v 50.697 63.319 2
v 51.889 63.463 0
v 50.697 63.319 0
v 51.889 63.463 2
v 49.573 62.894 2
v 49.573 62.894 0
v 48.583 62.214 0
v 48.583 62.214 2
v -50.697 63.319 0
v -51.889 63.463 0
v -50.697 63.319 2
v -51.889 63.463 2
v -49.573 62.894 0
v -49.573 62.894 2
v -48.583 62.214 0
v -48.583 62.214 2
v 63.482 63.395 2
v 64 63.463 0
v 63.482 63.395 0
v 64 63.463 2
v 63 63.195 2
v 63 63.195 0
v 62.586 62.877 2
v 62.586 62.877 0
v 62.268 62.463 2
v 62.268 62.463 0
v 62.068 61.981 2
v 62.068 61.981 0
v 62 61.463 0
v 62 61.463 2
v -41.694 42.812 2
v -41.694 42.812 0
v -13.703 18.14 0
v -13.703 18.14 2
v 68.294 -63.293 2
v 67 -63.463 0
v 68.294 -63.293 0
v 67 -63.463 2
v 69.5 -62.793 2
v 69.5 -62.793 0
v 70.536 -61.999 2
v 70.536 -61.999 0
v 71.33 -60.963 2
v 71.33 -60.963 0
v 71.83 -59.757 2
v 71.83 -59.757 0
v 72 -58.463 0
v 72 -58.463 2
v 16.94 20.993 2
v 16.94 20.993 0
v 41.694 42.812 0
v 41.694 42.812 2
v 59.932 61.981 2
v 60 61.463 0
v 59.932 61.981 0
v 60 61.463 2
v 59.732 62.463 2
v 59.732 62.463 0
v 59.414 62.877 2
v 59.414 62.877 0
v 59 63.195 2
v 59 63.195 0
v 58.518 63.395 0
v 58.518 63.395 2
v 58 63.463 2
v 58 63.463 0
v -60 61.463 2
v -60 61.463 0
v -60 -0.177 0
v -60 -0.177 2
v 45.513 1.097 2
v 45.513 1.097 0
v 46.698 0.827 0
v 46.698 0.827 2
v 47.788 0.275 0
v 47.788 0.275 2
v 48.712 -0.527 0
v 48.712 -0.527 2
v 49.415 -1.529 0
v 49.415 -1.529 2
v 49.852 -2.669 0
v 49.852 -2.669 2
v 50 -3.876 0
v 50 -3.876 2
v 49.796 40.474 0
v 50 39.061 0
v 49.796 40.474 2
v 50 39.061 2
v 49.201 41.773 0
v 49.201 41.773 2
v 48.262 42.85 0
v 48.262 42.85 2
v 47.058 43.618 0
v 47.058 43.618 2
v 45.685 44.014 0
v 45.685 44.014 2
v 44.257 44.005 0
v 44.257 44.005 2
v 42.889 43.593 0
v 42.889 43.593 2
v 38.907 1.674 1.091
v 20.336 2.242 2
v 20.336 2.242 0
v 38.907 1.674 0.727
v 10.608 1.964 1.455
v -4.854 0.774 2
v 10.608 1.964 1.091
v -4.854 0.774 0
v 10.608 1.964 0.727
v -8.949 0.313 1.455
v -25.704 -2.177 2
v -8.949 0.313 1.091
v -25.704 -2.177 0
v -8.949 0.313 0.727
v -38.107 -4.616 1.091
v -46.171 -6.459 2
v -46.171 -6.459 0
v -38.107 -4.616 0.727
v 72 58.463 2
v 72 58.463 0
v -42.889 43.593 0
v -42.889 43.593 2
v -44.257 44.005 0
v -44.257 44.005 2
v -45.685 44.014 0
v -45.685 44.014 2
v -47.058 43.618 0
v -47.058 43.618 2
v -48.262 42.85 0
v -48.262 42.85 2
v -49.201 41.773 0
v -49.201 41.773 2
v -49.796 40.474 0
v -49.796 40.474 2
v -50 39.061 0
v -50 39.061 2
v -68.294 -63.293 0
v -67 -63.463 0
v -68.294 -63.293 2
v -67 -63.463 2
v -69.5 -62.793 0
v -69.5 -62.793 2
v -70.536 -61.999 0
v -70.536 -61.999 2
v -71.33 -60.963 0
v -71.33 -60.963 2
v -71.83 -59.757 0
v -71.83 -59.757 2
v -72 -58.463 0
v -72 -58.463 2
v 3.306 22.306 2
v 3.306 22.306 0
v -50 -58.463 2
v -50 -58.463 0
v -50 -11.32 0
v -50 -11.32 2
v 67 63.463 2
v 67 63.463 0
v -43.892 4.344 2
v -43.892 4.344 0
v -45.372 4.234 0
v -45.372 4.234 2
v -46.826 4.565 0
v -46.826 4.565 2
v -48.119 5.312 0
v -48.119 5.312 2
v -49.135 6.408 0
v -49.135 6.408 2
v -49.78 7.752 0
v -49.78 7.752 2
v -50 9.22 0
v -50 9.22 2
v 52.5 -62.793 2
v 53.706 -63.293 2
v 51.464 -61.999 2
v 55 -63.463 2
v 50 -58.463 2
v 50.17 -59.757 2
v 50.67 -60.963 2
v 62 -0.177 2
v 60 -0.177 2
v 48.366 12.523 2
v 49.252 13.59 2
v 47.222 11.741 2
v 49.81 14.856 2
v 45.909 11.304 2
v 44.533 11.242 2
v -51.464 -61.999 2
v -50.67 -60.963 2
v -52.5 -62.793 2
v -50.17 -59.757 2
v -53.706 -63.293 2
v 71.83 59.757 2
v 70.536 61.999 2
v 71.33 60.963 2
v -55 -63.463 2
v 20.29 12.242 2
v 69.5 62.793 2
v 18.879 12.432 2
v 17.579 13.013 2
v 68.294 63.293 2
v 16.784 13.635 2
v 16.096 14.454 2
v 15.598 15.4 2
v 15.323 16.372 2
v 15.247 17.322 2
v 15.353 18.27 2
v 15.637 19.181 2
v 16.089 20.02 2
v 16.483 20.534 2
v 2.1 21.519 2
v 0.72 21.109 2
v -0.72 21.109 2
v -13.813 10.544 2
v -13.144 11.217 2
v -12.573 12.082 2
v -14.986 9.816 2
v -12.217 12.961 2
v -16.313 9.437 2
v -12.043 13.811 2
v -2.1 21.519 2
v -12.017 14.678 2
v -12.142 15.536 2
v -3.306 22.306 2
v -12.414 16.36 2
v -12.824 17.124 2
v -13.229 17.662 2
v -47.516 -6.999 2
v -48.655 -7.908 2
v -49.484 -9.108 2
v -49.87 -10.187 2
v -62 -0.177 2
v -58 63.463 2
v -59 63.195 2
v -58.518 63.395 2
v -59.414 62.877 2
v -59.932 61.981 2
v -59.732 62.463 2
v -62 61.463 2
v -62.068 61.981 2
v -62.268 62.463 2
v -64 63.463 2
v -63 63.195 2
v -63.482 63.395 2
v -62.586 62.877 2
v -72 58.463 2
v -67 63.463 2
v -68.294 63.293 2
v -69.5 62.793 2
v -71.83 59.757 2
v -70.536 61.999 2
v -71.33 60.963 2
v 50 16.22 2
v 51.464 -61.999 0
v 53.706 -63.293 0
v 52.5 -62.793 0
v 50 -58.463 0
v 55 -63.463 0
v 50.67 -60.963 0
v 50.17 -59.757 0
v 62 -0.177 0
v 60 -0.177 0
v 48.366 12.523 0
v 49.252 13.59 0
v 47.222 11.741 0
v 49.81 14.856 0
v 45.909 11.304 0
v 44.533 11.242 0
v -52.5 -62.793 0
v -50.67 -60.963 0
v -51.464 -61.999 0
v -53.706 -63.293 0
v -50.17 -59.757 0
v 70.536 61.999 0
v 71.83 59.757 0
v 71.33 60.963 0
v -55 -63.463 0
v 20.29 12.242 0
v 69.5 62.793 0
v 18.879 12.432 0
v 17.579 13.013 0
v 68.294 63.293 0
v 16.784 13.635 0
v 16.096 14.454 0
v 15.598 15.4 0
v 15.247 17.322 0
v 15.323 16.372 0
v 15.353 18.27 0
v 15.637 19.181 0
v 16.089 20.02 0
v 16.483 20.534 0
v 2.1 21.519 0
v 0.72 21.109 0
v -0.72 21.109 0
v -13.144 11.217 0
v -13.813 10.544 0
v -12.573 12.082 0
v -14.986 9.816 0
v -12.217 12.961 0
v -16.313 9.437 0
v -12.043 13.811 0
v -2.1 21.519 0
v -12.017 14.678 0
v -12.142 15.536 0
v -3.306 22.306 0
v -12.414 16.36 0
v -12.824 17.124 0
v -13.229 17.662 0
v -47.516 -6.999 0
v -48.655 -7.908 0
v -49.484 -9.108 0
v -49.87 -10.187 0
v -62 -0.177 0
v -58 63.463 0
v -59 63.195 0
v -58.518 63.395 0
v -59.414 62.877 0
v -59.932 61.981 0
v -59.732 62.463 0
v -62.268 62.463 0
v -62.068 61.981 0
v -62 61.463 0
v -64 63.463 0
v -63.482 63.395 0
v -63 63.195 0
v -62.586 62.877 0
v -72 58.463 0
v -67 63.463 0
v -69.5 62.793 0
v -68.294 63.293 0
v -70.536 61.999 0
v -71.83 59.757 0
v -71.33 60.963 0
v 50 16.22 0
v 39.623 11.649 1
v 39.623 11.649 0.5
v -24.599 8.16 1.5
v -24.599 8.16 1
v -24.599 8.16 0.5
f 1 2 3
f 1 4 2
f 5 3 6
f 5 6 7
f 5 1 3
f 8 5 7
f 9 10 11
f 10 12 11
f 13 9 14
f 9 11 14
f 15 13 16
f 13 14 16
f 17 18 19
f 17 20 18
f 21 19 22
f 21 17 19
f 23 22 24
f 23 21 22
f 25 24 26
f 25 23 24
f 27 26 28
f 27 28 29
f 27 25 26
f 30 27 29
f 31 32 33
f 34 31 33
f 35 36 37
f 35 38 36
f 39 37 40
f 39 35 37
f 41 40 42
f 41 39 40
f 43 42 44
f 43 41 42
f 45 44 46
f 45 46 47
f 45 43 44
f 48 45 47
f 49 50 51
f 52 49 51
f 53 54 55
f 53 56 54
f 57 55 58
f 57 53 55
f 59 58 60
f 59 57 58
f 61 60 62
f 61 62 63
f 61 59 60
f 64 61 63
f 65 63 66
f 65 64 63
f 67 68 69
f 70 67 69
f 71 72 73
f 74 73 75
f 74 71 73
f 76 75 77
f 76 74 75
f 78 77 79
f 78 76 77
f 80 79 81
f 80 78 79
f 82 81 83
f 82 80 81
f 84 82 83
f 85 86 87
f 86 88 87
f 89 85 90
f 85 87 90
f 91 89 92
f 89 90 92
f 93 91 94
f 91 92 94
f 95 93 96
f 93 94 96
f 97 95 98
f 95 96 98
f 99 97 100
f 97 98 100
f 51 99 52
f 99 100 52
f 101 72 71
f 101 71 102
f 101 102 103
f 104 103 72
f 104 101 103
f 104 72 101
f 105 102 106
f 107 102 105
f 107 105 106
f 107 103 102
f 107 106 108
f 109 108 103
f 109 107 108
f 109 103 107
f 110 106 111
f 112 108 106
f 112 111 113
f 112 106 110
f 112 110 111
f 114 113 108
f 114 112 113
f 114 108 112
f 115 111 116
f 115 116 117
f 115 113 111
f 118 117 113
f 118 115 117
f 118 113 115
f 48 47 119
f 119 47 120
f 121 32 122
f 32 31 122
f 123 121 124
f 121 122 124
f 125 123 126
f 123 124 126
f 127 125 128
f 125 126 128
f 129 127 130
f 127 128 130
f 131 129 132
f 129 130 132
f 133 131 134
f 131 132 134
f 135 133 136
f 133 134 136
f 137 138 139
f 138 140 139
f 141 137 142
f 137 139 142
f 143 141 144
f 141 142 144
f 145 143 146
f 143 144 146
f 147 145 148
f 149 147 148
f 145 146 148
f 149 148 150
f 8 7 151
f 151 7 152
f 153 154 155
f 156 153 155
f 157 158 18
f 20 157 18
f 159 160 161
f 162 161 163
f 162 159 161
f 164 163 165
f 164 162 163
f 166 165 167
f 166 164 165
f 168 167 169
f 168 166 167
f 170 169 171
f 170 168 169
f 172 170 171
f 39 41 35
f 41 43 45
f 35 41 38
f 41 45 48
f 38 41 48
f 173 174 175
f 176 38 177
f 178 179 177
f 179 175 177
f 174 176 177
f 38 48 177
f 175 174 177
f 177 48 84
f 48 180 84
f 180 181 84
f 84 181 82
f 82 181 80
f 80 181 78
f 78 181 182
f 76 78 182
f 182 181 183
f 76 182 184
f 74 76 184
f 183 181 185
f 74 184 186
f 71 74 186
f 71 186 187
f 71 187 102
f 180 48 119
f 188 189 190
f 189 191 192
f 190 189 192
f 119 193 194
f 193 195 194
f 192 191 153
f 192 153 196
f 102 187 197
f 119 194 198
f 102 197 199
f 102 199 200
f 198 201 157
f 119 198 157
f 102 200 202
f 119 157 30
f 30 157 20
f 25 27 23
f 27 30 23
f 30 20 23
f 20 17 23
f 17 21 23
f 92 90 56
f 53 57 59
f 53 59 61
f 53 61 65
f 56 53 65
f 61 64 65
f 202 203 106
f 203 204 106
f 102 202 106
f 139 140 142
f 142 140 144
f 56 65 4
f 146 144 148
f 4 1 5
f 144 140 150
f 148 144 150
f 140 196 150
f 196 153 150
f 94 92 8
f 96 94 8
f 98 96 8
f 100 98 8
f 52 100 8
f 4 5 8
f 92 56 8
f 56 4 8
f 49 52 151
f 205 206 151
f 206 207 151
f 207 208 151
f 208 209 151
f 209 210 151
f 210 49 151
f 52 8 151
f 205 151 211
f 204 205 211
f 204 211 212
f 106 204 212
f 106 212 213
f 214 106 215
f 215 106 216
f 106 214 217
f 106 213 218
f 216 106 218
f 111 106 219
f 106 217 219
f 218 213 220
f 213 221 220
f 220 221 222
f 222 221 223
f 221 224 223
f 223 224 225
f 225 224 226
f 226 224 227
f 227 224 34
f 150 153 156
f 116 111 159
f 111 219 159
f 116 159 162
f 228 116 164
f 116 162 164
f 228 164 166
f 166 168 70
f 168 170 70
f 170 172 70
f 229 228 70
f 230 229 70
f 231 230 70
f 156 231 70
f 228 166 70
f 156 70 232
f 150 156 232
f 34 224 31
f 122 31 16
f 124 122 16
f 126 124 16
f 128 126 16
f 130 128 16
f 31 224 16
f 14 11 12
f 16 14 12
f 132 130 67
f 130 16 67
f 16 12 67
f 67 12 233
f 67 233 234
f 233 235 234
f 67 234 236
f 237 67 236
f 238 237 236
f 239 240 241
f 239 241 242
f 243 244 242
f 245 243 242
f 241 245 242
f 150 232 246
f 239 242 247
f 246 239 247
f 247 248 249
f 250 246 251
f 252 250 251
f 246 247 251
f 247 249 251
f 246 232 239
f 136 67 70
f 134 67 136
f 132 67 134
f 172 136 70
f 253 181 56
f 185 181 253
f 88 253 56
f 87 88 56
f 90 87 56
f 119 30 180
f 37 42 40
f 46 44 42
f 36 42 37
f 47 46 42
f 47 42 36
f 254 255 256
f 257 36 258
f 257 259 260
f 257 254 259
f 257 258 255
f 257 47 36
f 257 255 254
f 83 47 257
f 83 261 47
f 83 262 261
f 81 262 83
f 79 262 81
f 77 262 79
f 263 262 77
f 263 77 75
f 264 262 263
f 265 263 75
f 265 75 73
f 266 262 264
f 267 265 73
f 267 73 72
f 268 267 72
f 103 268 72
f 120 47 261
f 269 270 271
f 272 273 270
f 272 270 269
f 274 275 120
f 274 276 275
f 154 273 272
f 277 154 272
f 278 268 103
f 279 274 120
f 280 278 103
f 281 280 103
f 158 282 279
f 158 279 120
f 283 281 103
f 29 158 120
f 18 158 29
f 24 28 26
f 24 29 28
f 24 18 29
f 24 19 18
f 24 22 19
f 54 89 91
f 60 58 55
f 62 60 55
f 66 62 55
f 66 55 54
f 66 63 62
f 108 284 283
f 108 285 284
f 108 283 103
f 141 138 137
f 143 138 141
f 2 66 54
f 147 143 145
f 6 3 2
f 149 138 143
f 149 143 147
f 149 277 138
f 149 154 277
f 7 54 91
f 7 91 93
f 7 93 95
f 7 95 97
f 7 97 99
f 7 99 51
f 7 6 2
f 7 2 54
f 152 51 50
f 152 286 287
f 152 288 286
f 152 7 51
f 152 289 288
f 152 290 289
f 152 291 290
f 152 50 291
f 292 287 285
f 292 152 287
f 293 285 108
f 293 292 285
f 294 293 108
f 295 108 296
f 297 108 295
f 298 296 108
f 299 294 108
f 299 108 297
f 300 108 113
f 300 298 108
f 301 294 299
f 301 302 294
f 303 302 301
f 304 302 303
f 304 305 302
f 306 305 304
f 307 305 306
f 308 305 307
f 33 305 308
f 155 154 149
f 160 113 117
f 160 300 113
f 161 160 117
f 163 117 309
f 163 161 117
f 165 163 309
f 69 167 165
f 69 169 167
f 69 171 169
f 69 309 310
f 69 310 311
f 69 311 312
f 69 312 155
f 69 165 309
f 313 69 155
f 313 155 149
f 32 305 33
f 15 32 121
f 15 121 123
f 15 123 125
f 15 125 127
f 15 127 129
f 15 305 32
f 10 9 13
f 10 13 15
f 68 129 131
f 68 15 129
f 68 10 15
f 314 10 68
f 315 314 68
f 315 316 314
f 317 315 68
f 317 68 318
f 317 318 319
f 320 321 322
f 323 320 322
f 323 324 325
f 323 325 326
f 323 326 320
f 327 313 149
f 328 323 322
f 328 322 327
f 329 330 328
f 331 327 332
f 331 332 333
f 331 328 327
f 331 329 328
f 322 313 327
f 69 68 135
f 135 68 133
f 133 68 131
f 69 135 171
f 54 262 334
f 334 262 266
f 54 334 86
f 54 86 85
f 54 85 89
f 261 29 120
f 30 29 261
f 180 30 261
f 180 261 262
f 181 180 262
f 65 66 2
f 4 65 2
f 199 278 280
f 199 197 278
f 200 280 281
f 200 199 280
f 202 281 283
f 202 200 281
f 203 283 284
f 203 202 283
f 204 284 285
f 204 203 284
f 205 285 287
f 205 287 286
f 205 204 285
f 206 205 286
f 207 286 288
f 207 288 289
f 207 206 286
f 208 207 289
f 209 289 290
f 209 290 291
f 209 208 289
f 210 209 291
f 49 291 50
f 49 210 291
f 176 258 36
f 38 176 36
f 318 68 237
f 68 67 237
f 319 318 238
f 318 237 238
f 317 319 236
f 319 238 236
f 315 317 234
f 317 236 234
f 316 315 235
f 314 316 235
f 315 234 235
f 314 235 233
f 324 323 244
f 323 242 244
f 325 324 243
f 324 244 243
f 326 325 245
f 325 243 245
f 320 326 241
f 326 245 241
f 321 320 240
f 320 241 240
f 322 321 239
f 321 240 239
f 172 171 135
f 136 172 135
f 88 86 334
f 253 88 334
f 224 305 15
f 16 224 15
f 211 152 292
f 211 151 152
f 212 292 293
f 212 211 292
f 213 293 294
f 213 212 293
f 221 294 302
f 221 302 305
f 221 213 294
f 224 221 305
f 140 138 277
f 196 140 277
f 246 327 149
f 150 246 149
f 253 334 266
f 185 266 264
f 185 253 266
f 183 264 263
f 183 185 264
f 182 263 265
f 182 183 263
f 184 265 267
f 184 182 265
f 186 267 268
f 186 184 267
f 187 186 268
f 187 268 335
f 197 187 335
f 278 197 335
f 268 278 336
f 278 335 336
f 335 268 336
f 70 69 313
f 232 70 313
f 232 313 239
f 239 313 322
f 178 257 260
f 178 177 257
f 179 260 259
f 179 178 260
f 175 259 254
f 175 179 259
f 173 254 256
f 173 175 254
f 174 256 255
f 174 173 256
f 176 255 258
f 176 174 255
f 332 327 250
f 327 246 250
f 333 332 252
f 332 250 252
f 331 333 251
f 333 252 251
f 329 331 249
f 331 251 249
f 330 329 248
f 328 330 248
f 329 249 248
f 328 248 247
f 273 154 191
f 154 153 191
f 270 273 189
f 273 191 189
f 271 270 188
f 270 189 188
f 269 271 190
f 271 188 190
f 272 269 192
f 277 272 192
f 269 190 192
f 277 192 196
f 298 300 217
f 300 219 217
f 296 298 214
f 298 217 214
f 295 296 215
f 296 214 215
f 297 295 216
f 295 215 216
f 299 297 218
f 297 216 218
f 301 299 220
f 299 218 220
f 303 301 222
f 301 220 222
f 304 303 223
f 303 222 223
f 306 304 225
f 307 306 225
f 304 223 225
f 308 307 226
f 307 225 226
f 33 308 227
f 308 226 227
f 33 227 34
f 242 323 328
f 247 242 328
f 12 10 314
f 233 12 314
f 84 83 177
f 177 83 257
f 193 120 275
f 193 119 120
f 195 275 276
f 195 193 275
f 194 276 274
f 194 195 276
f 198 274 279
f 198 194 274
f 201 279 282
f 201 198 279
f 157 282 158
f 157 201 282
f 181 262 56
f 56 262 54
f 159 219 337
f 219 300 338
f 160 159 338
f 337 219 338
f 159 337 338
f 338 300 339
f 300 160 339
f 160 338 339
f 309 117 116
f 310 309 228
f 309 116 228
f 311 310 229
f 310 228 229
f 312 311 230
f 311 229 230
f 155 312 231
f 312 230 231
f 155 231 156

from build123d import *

# Parameters (mm, degrees)
BOSS_EXTRUDE1_DEPTH = 2
FILLET1_R           = 5
FILLET3_R           = 2
FILLET4_R           = 5


# Read off the part's stored shape, not the designer's step: Boss-Extrude1
with BuildPart() as part:
    # Boss-Extrude1 outline → Boss-Extrude1 (new body)
    with BuildSketch(Plane.XY):
        with BuildLine():
            add(Edge.make_bspline(
                [(50, 0.585067943), (46.302901229, 1.048620246), (37.443381796, 1.911582539), (24.310917963, 2.384537211), (13.949921349, 2.147279936), (6.881664213, 1.770872157), (3.157213928, 1.513128323), (-0.569629629, 1.197220359), (-4.294991328, 0.843416739), (-11.799290896, 0.01694185), (-23.43372993, -1.666844937), (-37.093919746, -4.304130089), (-46.054304433, -6.407794893), (-49.999999999, -7.403419123)],
                knots=[0.392731, 0.392731, 0.392731, 0.392731, 0.4375, 0.5, 0.551677708, 0.562945669, 0.585481591, 0.596749552, 0.608017513, 0.630553434, 0.6875, 0.75, 0.799585435, 0.799585435, 0.799585435, 0.799585435], degree=3))
            Line((50, 0.585067943), (50, -63.46310087))
            Line((50, -63.46310087), (72, -63.46310087))
            Line((72, -63.46310087), (72, 63.46310087))
            Line((72, 63.46310087), (62, 63.46310087))
            Line((62, 63.46310087), (62, -0.17689913))
            Line((62, -0.17689913), (60, -0.17689913))
            Line((60, -0.17689913), (60, 63.46310087))
            Line((60, 63.46310087), (50, 63.46310087))
            Line((50, 63.46310087), (0, 19.391503044))
            Line((0, 19.391503044), (-50, 63.46310087))
            Line((-50, 63.46310087), (-60, 63.46310087))
            Line((-60, 63.46310087), (-60, -0.17689913))
            Line((-60, -0.17689913), (-62, -0.17689913))
            Line((-62, -0.17689913), (-62, 63.46310087))
            Line((-62, 63.46310087), (-72, 63.46310087))
            Line((-72, 63.46310087), (-72, -63.46310087))
            Line((-72, -63.46310087), (-50, -63.46310087))
            Line((-50, -63.46310087), (-49.999999999, -7.403419123))
        make_face()
        with BuildLine():
            add(Edge.make_bspline(
                [(-5.349354195, 10.7764699), (-6.473284635, 10.660224491), (-12.934279192, 9.954218876), (-24.646320739, 8.284783337), (-38.353198567, 5.637906199), (-46.754684535, 3.697054478), (-49.999999999, 2.901338723)],
                knots=[0.611854507, 0.611854507, 0.611854507, 0.611854507, 0.625, 0.6875, 0.75, 0.789622747, 0.789622747, 0.789622747, 0.789622747], degree=3))
            Line((-49.999999999, 2.901338723), (-50, 50.132975987))
            Line((-50, 50.132975987), (-5.349354195, 10.7764699))
        make_face(mode=Mode.SUBTRACT)
        with BuildLine():
            Line((50, 50.132975987), (50, 10.659702462))
            add(Edge.make_bspline(
                [(50, 10.659702462), (46.536536843, 11.073334631), (37.671385716, 11.912189244), (23.444000892, 12.423604272), (12.413305008, 12.108752618), (6.751894701, 11.770134287), (6.456063808, 11.751959115)],
                knots=[0.397516142, 0.397516142, 0.397516142, 0.397516142, 0.4375, 0.5, 0.5625, 0.565946061, 0.565946061, 0.565946061, 0.565946061], degree=3))
            Line((6.456063808, 11.751959115), (50, 50.132975987))
        make_face(mode=Mode.SUBTRACT)
    extrude(amount=BOSS_EXTRUDE1_DEPTH)

    # Fillet1
    fillet1_edges = [part.edges().sort_by_distance(p)[0] for p in [
        (-72, -63.46310087, 1),
        (-72, 63.46310087, 1),
        (-50, 63.46310087, 1),
        (50, 63.46310087, 1),
        (72, 63.46310087, 1),
        (50, 0.585067943, 1),
        (72, -63.46310087, 1),
        (50, -63.46310087, 1),
        (-50, -63.46310087, 1),
        (-49.999999999, -7.403419123, 1),
        (0, 19.391503044, 1),
    ]]
    fillet(fillet1_edges, radius=FILLET1_R)

    # Fillet3
    fillet3_edges = [part.edges().sort_by_distance(p)[0] for p in [
        (-62, 63.46310087, 1),
        (-60, 63.46310087, 1),
        (60, 63.46310087, 1),
        (62, 63.46310087, 1),
    ]]
    fillet(fillet3_edges, radius=FILLET3_R)

    # Fillet4
    fillet4_edges = [part.edges().sort_by_distance(p)[0] for p in [
        (50, 50.132975987, 1),
        (6.456063808, 11.751959115, 1),
        (50, 10.659702462, 1),
        (-50, 50.132975987, 1),
        (-49.999999999, 2.901338723, 1),
        (-5.349354195, 10.7764699, 1),
    ]]
    fillet(fillet4_edges, radius=FILLET4_R)


solid = part.part
